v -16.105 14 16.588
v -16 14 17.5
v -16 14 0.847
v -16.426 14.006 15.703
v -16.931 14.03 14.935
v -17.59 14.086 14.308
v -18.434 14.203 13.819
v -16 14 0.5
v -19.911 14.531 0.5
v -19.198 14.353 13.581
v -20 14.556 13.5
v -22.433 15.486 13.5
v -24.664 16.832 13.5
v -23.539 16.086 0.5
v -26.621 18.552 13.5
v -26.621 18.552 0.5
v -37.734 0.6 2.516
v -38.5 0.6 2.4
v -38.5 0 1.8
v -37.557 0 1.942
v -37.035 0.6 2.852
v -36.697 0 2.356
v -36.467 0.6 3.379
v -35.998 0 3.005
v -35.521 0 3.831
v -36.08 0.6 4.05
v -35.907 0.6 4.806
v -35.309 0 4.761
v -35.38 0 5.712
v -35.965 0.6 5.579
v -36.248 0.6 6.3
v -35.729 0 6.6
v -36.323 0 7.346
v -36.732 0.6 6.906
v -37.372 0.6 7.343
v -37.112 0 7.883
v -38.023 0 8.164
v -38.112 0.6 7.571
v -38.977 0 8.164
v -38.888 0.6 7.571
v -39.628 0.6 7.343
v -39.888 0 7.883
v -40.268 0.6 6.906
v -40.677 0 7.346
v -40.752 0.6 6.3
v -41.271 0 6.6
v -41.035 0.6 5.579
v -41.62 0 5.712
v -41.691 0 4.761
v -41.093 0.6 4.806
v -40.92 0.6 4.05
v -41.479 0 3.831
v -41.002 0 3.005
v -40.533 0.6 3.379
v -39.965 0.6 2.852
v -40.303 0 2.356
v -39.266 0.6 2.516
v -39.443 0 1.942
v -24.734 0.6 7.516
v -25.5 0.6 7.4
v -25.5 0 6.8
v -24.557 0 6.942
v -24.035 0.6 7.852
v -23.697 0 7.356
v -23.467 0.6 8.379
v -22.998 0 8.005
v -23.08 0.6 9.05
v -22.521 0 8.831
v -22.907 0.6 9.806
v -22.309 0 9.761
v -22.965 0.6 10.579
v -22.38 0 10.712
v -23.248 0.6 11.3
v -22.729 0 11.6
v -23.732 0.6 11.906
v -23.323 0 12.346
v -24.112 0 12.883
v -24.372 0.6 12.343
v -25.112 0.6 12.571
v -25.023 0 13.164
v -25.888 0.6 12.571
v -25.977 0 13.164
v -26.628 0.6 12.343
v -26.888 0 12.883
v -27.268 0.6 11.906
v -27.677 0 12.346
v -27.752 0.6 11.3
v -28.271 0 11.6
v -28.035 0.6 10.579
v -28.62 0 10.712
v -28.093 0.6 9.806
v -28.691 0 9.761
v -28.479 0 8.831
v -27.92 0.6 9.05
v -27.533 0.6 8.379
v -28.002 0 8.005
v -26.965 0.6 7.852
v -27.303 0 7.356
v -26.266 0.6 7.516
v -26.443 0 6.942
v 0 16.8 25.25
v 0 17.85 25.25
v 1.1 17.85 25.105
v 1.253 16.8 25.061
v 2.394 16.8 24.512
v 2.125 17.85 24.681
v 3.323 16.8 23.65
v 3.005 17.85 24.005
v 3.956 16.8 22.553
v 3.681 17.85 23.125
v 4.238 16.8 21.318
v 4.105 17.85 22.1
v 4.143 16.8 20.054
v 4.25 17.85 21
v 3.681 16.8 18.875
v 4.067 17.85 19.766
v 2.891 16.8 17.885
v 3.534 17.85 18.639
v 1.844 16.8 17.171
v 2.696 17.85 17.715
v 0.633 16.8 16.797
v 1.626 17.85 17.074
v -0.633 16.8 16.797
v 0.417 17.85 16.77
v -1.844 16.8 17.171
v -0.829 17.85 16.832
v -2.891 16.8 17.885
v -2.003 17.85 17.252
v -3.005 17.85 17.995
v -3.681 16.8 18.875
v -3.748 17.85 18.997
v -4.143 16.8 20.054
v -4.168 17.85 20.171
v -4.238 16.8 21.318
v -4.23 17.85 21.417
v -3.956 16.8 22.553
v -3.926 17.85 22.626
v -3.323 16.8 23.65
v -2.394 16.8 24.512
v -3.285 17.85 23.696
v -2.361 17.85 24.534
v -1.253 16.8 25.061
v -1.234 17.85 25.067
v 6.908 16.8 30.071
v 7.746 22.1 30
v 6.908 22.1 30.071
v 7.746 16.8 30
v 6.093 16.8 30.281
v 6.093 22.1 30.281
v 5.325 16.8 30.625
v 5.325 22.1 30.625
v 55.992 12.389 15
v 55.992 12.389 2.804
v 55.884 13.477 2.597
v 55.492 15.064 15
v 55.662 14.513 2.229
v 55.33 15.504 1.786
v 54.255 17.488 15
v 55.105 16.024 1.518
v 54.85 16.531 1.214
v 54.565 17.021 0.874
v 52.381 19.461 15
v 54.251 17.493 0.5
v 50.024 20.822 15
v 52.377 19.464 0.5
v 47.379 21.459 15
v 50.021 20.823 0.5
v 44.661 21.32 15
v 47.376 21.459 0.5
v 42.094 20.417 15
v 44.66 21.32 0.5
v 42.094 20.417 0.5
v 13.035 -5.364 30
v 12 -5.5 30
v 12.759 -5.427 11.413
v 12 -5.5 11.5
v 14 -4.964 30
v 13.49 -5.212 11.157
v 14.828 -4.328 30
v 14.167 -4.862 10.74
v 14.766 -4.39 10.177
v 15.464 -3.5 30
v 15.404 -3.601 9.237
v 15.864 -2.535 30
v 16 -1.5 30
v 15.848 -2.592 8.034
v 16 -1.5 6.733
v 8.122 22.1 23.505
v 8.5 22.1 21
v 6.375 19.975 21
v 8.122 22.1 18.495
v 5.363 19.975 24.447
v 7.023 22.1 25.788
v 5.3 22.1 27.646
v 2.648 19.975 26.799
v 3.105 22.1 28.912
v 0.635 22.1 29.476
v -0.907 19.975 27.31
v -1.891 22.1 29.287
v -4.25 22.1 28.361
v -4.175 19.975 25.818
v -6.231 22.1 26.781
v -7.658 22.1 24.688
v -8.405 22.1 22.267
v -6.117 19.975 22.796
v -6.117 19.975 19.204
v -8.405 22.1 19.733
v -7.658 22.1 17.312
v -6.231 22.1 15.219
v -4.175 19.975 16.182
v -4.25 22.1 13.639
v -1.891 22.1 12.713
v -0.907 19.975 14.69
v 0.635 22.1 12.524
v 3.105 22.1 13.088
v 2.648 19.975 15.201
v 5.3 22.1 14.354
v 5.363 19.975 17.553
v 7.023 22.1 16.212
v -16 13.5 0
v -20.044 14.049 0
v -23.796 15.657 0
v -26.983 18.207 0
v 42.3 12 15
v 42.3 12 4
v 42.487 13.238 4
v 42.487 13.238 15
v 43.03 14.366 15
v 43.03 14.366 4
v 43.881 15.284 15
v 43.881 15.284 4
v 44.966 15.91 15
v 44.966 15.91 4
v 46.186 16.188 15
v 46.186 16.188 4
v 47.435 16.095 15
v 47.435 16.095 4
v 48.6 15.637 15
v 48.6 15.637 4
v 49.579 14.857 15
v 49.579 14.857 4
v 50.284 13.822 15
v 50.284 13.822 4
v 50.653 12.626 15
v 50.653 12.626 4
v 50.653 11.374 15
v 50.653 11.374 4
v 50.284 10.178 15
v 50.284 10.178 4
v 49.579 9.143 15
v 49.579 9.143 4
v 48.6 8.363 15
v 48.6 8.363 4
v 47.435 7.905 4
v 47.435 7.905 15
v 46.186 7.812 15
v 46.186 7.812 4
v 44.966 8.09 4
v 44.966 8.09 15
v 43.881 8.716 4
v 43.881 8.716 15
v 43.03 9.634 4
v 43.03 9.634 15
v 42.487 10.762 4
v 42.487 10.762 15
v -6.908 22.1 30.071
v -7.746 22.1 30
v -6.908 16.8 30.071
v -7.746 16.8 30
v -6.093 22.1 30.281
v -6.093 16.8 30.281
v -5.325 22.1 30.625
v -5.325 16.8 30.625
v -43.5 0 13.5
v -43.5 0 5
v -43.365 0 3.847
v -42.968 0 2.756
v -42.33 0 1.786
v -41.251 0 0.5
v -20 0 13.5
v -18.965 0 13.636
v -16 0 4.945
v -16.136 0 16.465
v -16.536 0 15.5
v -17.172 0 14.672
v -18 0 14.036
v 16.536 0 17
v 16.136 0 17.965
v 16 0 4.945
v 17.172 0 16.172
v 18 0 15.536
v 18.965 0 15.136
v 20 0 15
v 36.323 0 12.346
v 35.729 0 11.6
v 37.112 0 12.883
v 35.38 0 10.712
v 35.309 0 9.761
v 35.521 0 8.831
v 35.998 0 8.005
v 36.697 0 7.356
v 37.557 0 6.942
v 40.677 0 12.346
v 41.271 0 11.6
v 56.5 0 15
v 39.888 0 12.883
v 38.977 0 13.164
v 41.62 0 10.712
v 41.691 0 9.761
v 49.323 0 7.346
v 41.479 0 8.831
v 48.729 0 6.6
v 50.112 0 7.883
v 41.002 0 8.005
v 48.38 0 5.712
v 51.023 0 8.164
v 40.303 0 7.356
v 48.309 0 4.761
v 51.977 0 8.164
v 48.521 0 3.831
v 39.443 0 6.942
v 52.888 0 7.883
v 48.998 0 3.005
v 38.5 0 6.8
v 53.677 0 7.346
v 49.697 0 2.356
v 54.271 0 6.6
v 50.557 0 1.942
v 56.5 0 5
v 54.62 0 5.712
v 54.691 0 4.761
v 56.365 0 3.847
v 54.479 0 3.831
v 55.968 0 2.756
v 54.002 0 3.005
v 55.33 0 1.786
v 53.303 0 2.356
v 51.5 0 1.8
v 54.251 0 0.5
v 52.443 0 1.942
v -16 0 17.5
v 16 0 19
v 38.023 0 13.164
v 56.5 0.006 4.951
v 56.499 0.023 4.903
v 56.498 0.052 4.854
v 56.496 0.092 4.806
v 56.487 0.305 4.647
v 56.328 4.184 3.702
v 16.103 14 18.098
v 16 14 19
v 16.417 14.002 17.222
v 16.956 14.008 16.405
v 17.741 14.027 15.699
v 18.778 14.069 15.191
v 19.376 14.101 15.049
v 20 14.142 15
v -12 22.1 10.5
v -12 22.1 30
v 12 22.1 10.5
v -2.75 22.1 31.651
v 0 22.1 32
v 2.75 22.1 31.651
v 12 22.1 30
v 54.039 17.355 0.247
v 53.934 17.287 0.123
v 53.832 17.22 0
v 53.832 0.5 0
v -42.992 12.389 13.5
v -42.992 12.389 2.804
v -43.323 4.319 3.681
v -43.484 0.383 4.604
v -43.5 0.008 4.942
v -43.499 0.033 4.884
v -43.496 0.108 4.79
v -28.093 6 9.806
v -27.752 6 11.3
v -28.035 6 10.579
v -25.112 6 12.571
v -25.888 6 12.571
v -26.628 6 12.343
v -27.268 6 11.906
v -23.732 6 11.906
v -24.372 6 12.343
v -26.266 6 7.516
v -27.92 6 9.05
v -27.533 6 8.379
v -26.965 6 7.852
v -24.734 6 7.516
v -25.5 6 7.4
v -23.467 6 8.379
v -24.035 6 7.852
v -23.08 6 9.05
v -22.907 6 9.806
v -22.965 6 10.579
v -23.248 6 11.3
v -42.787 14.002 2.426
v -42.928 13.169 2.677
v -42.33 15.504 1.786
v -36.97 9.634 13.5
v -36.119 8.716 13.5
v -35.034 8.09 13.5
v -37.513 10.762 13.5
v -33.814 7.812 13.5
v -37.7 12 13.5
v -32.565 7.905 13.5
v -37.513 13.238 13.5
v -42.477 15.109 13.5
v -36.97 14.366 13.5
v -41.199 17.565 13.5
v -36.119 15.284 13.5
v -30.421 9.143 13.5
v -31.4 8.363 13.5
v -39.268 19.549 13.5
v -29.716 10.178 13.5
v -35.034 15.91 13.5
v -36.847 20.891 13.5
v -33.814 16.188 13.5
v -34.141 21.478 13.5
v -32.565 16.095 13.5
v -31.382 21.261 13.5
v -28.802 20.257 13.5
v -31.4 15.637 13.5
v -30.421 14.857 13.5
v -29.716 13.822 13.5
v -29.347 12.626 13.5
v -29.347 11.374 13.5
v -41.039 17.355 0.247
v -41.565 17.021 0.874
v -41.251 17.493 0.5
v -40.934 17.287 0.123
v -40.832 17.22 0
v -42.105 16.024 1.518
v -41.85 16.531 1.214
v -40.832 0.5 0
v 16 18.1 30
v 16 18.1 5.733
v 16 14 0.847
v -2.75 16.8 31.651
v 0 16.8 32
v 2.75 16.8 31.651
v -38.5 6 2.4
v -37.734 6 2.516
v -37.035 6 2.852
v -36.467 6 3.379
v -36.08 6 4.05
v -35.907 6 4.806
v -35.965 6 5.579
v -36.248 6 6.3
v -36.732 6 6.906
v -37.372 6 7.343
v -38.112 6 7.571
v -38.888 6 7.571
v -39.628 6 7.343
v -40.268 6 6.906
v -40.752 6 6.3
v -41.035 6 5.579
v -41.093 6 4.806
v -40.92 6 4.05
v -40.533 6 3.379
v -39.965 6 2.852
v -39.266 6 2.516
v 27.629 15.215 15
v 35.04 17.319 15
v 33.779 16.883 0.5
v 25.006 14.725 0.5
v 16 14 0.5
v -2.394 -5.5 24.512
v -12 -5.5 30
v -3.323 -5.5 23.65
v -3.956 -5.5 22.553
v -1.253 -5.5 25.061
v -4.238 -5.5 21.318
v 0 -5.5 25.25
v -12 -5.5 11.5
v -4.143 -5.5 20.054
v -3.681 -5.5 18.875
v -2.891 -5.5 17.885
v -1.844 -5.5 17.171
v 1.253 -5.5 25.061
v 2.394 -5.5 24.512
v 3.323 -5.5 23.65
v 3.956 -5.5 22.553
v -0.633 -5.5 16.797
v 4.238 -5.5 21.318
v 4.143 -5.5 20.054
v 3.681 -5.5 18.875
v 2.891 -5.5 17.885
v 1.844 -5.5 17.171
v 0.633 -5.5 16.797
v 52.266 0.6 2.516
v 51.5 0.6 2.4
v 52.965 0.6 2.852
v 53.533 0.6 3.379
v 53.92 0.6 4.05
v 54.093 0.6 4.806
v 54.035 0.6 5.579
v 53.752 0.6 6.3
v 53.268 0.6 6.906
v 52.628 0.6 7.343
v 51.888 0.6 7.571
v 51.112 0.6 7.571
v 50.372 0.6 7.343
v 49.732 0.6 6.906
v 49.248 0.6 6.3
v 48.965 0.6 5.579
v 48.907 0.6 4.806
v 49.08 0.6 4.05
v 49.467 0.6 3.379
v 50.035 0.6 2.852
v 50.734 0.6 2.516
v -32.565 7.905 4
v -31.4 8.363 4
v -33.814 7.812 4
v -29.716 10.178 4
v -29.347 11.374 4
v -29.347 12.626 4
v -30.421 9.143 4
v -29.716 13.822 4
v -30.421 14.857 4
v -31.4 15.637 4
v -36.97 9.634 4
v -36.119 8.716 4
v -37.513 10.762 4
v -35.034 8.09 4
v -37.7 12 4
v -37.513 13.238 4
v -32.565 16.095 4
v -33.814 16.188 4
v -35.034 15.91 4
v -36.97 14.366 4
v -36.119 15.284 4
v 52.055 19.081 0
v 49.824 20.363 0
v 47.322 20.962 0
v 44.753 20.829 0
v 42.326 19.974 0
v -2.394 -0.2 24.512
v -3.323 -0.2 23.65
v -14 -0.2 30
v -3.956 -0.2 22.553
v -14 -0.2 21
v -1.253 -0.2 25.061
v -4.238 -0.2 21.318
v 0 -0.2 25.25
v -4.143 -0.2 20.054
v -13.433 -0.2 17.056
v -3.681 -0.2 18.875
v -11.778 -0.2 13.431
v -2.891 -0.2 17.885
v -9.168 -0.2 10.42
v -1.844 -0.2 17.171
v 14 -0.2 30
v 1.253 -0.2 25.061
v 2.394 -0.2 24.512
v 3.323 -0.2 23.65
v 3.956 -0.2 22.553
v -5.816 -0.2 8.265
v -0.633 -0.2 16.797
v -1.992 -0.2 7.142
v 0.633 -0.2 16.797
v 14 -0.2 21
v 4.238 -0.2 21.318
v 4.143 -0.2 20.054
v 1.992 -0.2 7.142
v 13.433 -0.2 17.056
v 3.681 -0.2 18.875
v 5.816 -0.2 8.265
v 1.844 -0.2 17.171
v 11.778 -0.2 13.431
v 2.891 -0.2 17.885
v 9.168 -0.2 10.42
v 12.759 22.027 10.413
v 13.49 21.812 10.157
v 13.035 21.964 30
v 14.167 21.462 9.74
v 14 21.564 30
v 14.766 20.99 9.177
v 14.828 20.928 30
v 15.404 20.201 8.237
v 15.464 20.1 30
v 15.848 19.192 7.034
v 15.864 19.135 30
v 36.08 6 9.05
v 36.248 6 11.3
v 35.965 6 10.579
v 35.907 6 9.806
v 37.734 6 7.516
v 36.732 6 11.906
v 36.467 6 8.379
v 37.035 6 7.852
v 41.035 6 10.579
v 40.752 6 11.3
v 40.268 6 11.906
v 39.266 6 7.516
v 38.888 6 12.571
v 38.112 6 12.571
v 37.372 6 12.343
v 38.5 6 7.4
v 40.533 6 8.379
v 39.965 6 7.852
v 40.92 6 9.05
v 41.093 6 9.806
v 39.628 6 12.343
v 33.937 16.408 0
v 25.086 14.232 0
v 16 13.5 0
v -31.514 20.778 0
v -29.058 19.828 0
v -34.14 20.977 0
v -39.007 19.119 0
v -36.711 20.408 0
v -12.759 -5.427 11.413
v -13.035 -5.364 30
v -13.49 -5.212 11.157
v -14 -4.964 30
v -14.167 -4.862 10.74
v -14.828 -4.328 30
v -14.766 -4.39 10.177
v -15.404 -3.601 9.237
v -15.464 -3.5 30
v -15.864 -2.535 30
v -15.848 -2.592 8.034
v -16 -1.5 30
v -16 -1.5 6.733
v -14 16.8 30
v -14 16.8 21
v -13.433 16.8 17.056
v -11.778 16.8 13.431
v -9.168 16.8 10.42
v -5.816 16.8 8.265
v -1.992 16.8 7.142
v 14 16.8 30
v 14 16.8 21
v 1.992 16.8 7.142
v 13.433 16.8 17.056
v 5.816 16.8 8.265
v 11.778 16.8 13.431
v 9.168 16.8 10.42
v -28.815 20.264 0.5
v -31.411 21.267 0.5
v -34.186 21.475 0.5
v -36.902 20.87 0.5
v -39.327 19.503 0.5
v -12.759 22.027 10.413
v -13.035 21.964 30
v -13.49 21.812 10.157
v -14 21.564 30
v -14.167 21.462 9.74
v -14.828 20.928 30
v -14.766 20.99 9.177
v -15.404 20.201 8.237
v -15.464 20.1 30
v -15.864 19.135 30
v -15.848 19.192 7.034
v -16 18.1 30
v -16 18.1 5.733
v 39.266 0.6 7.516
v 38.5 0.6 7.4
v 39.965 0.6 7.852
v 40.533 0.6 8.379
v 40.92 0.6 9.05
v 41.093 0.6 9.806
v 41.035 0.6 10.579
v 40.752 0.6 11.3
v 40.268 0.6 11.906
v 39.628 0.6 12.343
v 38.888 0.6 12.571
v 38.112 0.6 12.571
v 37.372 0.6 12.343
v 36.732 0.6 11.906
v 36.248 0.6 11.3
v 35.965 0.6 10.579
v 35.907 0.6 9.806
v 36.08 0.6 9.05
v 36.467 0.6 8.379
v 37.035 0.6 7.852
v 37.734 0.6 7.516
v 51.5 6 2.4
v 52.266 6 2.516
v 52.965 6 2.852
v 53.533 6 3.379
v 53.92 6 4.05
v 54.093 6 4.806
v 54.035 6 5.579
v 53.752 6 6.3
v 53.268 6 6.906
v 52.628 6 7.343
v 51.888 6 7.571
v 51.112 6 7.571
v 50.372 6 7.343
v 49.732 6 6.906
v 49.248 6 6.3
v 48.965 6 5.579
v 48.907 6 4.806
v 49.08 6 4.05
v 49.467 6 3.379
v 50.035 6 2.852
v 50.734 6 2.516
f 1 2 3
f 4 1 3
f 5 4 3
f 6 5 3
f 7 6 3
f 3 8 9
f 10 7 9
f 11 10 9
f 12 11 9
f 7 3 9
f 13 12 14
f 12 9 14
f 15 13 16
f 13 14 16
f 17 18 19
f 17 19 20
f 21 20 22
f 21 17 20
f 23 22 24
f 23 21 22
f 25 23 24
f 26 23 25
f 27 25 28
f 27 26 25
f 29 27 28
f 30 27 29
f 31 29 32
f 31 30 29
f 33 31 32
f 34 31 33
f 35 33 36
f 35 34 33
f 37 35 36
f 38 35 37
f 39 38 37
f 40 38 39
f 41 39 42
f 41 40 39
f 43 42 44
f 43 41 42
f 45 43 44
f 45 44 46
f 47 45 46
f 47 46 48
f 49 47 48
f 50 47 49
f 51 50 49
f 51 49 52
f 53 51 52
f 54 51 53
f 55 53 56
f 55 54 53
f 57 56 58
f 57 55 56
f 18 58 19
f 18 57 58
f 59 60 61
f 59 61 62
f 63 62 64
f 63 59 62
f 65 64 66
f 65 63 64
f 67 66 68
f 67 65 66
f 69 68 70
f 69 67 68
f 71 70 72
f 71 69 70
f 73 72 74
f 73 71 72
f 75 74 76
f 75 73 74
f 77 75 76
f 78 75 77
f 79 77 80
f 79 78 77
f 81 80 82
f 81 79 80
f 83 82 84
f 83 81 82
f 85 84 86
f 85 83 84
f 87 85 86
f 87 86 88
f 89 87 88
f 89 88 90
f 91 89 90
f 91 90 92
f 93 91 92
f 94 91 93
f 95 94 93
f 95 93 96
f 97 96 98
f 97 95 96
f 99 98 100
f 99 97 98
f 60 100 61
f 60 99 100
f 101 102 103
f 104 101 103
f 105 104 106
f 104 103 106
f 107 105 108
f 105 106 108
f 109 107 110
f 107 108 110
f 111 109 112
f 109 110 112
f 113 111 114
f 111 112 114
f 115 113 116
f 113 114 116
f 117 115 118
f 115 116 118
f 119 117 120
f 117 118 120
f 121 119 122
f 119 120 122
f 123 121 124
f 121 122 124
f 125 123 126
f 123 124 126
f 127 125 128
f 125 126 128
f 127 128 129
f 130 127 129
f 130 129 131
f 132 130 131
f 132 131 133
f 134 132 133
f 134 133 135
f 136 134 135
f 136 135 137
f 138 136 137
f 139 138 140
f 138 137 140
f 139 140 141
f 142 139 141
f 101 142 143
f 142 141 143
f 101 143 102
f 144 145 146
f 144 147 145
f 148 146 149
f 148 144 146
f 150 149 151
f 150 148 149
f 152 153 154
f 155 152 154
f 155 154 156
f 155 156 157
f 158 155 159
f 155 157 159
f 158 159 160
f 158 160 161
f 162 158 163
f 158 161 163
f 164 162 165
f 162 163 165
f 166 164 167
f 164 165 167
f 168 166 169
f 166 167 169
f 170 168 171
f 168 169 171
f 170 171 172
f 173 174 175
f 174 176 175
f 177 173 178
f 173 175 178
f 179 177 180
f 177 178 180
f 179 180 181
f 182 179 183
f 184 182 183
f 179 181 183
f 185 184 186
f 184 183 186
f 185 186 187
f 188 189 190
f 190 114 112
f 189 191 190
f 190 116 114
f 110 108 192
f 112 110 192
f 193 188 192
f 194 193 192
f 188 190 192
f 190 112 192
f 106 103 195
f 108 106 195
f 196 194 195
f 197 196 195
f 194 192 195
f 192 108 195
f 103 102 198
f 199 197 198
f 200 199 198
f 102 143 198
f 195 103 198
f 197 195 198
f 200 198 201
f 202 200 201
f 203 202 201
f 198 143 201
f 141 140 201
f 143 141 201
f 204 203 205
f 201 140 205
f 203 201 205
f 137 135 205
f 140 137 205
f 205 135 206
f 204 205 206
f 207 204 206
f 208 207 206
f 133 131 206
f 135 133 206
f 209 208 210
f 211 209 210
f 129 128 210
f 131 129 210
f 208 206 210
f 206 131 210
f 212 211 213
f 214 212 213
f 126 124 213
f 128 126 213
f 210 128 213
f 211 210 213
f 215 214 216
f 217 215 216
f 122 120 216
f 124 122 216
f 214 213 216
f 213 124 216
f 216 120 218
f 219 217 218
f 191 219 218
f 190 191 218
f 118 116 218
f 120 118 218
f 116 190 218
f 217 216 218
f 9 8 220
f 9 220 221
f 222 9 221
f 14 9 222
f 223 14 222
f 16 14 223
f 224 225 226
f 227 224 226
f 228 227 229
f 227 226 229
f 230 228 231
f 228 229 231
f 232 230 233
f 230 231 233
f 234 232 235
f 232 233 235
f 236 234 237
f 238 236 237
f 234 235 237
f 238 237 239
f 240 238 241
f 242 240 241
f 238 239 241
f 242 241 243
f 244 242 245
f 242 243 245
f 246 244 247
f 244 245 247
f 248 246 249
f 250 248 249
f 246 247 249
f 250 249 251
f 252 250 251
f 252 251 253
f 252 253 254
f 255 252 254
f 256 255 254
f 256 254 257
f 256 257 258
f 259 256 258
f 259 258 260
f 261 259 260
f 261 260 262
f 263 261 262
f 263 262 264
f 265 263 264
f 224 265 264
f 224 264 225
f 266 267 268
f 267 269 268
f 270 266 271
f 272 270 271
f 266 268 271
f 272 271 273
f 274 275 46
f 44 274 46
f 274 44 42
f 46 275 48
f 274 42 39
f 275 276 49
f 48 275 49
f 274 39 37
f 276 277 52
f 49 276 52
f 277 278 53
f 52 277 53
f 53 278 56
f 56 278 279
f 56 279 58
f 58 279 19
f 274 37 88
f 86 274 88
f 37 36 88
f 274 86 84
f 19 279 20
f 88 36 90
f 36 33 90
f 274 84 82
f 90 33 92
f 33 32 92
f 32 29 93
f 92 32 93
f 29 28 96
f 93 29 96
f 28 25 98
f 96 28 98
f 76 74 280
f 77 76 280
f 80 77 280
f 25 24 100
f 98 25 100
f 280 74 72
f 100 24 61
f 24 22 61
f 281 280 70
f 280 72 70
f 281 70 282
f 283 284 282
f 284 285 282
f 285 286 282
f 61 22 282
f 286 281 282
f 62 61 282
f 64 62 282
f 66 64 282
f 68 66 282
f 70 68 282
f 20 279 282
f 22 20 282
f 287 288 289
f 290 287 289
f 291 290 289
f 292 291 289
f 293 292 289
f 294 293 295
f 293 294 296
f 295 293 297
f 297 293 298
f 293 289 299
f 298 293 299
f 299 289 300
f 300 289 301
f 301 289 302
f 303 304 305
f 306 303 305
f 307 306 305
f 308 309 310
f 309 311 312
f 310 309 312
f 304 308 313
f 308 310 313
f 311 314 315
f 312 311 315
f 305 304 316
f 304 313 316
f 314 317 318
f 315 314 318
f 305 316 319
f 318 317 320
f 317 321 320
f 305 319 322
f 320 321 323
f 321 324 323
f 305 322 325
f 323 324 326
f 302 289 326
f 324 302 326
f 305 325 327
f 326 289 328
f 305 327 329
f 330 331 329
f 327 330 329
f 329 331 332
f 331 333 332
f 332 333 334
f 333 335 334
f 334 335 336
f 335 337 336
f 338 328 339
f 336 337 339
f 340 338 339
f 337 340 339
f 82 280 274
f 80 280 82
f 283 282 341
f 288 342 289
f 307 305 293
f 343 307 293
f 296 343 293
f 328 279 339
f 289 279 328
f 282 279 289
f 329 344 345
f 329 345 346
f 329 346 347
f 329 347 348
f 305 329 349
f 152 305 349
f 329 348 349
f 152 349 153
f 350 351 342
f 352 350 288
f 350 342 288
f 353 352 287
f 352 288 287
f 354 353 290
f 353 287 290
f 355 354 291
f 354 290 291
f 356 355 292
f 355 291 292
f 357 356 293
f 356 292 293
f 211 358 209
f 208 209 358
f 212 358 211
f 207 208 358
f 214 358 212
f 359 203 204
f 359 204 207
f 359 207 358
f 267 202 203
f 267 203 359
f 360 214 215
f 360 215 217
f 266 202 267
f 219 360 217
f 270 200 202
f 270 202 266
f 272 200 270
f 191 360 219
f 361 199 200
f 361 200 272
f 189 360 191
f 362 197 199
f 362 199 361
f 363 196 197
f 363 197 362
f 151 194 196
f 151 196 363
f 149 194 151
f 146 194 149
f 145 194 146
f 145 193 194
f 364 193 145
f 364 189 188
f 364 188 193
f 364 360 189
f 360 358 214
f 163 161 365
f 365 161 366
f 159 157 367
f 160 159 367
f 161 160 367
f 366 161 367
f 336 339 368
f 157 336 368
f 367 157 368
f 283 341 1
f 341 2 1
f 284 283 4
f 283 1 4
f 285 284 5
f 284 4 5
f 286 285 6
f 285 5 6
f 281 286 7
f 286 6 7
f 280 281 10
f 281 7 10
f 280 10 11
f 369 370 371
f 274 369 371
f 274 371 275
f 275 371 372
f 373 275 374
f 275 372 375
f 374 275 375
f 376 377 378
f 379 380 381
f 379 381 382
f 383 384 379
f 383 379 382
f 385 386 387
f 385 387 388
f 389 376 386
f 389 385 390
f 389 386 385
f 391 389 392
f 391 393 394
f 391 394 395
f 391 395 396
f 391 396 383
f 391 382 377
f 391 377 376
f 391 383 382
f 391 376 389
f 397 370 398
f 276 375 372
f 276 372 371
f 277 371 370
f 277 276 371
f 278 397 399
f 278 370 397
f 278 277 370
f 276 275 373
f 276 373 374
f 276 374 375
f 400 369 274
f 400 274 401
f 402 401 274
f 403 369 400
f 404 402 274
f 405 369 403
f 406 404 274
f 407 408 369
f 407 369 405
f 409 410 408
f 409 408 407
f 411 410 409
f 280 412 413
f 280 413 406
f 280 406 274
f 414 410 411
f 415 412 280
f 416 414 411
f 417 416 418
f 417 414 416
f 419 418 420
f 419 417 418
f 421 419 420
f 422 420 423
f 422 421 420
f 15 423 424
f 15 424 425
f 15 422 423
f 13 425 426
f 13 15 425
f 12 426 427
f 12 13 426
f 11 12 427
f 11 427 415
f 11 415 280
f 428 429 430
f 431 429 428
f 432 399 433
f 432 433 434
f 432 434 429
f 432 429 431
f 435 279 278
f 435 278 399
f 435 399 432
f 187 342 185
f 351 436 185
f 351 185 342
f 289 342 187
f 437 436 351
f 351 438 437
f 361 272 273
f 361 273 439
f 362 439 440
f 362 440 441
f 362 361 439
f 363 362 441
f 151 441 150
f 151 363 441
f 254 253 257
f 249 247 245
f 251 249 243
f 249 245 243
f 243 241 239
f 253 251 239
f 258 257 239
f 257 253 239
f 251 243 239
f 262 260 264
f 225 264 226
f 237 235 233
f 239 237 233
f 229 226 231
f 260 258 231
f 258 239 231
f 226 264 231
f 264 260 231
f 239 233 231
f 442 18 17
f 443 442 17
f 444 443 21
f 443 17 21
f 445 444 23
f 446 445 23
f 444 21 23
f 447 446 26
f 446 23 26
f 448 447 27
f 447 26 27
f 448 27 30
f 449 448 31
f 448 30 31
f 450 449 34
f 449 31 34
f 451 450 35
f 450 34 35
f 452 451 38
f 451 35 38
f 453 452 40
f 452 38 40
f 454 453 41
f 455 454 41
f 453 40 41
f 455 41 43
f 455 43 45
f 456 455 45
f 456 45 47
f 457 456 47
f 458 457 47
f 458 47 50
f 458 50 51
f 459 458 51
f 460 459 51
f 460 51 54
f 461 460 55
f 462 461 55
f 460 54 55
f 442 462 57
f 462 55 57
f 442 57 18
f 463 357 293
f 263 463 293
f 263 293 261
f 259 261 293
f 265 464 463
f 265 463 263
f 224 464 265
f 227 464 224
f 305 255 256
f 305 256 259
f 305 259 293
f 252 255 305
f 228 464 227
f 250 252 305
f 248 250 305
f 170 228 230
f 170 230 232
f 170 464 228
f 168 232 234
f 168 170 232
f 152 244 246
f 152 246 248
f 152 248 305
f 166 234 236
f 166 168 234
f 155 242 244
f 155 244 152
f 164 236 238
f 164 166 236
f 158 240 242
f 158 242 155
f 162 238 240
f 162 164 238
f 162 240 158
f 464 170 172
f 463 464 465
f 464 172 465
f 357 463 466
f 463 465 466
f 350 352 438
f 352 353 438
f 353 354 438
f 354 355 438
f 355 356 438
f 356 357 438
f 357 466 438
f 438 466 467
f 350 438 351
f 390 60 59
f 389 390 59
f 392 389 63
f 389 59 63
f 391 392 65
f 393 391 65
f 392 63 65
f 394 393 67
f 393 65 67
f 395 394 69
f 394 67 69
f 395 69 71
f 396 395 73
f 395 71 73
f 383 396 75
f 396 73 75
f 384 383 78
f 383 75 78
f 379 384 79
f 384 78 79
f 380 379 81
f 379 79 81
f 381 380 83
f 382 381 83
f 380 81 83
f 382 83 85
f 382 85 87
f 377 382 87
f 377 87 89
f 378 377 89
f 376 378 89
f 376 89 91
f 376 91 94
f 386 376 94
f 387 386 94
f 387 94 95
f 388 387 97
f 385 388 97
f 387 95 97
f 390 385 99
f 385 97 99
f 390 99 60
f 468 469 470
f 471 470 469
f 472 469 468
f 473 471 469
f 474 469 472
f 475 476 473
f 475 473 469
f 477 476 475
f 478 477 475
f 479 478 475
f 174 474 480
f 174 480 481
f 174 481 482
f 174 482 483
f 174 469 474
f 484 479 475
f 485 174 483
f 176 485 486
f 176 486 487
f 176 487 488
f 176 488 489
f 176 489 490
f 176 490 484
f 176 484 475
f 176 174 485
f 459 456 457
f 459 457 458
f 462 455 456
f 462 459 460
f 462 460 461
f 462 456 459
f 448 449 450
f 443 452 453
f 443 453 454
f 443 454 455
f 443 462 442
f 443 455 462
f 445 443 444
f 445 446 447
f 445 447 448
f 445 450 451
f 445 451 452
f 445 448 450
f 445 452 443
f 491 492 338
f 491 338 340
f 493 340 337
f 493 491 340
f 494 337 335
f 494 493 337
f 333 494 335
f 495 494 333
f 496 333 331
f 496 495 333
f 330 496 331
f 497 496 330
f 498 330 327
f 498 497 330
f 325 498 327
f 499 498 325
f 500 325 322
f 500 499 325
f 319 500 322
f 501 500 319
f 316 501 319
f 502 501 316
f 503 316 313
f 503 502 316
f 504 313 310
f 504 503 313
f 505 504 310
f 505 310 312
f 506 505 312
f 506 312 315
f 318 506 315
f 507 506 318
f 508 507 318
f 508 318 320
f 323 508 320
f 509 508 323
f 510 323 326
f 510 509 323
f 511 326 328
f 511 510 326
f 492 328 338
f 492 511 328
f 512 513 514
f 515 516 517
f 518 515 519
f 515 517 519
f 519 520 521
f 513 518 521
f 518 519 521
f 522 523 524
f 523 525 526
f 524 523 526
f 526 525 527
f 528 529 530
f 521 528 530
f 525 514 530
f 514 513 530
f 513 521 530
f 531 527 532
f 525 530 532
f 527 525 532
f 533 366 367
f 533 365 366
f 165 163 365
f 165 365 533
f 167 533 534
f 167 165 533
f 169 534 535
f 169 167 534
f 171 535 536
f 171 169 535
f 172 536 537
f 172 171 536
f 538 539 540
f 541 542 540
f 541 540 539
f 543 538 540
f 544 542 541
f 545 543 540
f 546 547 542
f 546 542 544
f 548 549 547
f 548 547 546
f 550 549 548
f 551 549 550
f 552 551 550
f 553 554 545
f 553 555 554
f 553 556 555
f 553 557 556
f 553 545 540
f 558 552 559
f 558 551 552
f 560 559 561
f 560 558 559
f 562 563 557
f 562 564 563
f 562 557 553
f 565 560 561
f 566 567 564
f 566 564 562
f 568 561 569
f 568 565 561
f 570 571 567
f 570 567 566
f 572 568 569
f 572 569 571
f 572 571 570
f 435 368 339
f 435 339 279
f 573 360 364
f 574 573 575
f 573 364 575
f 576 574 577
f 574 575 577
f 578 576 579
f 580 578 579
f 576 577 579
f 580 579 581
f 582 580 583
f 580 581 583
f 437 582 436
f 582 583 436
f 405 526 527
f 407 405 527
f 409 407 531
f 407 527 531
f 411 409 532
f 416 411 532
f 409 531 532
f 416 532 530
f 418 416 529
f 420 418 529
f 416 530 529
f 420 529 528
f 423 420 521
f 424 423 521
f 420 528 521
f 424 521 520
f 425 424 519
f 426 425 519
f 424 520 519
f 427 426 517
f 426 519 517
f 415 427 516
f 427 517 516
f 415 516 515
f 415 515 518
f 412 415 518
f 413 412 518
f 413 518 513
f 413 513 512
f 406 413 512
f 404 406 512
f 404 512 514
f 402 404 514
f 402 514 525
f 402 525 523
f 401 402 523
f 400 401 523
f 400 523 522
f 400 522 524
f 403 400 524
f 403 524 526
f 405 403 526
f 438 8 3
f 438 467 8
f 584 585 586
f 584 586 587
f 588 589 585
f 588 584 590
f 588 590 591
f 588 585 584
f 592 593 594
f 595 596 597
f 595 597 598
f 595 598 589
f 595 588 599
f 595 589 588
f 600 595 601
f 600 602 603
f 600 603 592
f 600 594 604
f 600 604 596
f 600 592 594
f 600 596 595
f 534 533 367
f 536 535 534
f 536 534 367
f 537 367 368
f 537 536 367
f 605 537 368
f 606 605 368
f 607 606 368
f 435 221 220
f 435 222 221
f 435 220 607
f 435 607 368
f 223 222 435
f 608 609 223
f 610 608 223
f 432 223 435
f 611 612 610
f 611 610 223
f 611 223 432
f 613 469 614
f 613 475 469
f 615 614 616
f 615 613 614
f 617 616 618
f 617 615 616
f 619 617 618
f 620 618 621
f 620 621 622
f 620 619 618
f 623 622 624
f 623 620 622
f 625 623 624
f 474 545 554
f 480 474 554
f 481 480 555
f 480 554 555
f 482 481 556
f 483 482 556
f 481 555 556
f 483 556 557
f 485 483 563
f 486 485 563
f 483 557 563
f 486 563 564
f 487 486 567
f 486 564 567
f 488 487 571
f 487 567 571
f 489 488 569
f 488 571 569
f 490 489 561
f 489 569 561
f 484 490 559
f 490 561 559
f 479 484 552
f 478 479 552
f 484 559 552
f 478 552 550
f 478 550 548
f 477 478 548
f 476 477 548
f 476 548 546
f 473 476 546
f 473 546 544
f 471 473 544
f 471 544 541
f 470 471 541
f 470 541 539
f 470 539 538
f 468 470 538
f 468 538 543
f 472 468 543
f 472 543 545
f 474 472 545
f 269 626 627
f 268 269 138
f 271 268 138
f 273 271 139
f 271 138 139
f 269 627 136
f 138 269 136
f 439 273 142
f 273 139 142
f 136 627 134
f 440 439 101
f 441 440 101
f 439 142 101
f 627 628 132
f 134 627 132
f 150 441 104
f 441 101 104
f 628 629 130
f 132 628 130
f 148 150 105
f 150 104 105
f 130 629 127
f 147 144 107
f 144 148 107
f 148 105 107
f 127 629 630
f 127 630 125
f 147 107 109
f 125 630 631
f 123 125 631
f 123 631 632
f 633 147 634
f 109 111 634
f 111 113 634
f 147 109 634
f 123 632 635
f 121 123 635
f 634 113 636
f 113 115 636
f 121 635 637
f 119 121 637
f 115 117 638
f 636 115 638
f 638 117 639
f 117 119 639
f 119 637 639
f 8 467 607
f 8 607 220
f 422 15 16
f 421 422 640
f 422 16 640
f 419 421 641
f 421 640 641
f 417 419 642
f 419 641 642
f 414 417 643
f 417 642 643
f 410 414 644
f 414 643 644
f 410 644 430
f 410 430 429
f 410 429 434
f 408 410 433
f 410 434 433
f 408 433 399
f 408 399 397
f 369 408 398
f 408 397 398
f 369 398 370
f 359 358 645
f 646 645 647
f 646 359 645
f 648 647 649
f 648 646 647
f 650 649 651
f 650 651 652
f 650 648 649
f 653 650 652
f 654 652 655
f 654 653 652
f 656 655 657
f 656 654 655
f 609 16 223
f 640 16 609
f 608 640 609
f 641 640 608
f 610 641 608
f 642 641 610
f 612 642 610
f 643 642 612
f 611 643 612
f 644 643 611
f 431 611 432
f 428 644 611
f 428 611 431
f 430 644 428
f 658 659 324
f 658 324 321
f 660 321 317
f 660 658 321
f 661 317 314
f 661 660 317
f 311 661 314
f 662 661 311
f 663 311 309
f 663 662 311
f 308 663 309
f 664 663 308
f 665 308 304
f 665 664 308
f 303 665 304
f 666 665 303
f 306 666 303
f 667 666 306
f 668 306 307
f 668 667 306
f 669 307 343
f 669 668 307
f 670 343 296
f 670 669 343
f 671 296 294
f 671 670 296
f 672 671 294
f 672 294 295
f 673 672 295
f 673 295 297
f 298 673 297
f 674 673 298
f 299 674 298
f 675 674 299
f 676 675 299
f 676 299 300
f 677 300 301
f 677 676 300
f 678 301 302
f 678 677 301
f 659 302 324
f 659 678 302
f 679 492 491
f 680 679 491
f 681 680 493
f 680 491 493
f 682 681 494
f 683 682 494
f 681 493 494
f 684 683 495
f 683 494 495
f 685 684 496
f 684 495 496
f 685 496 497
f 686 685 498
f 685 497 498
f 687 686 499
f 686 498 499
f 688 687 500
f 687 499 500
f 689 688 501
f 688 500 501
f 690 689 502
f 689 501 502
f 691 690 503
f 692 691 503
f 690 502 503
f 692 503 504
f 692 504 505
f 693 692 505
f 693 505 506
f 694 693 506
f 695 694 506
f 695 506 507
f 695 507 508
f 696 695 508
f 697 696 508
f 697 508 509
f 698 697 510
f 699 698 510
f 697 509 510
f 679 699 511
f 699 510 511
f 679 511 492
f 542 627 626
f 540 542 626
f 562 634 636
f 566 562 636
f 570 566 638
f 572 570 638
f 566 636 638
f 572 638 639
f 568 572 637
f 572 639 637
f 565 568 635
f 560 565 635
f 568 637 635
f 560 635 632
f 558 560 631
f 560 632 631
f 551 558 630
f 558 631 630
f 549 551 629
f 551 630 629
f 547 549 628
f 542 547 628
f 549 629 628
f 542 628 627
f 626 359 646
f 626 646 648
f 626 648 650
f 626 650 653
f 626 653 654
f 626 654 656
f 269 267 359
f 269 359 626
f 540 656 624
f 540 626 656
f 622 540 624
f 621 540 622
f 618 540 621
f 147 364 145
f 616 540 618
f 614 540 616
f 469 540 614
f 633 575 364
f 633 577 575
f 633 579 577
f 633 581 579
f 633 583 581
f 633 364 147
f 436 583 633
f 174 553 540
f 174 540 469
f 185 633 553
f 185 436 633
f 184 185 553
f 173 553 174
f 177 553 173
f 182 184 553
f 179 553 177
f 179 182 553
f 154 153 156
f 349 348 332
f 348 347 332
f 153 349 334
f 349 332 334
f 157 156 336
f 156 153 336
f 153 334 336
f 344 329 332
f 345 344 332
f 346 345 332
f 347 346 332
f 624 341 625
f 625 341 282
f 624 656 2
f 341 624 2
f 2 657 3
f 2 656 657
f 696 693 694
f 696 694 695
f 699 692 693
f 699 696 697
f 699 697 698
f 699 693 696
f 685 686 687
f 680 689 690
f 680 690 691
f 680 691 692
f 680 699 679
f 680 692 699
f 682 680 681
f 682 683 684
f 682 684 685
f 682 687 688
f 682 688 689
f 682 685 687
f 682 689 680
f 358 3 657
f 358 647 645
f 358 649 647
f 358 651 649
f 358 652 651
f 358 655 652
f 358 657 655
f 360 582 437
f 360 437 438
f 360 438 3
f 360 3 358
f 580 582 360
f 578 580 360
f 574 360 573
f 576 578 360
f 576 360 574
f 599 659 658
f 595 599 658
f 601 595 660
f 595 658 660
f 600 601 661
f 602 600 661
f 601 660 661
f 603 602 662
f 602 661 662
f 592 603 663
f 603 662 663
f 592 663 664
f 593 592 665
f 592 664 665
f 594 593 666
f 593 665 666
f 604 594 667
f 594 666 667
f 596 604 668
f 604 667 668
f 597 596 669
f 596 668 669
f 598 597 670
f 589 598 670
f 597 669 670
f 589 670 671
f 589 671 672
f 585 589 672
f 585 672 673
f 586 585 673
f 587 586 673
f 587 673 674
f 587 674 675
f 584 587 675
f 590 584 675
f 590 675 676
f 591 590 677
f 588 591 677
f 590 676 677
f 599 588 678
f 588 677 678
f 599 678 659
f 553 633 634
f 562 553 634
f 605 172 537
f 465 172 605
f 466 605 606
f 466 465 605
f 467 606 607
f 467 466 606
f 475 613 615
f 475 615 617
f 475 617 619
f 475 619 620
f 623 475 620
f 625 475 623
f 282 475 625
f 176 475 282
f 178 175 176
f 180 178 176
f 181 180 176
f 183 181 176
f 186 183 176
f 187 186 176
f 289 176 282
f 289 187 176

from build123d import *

# Parameters (mm, degrees)
BOSS_EXTRUDE1_DEPTH                             = 16
SKETCH2_R                                       = 4.25
CUT_EXTRUDE1_DEPTH                              = 28.6
CUT_EXTRUDE2_START                              = -5.3
CUT_EXTRUDE2_DEPTH                              = 17
CSK_FOR_M8_FLAT_HEAD_MACHINE_SCREW1_D           = 8
CSK_FOR_M8_FLAT_HEAD_MACHINE_SCREW1_CSINK_D     = 17
CSK_FOR_M8_FLAT_HEAD_MACHINE_SCREW1_CSINK_ANGLE = 90
SKETCH6_R                                       = 4.2
BOSS_EXTRUDE2_DEPTH                             = 15
SKETCH7_R                                       = 4.2
BOSS_EXTRUDE3_DEPTH                             = 4
SKETCH9_R                                       = 2.6
CUT_EXTRUDE3_DEPTH                              = 6
CUT_EXTRUDE4_DEPTH                              = 1.5
FILLET2_R                                       = 4
FILLET3_R                                       = 4
BOSS_EXTRUDE4_DEPTH                             = 5.3
FILLET4_R                                       = 5
CHAMFER1_SIZE                                   = 0.6
CUT_EXTRUDE5_DEPTH                              = 23.1
CHAMFER2_SIZE                                   = 0.5


with BuildPart() as part:
    # Sketch1 → Boss-Extrude1 (new body, symmetric)
    with BuildSketch(Plane(origin=(0, 0, 0), x_dir=(0, 0, -1), z_dir=(1, 0, 0))):
        Polygon((0, 0), (0, 14), (-0.8467959, 14), (-10.5, 22.1), (-30, 22.1), (-30, -5.5), (-11.5, -5.5), (-4.945355241, 0), align=None)
    extrude(amount=BOSS_EXTRUDE1_DEPTH, both=True)

    # Sketch2 → Cut-Extrude1 (cut, through all)
    with BuildSketch(Plane(origin=(0, 22.1, 0), x_dir=(1, 0, 0), z_dir=(0, 1, 0))):
        with Locations(Location((0, -21, 0), (0, 0, 270))):  # turned: the seam where the file's is
            Circle(SKETCH2_R)
    extrude(amount=-CUT_EXTRUDE1_DEPTH, mode=Mode.SUBTRACT)

    # Sketch3 → Cut-Extrude2 (cut)
    with BuildSketch(Plane(origin=(0, 22.1, 0), x_dir=(1, 0, 0), z_dir=(0, 1, 0)).offset(CUT_EXTRUDE2_START)):
        with BuildLine():
            Line((-14, -21), (-14, -59.082734499))
            Line((-14, -59.082734499), (14, -59.082734499))
            Line((14, -59.082734499), (14, -21))
            ThreePointArc((14, -21), (0, -7), (-14, -21))
        make_face()
    extrude(amount=-CUT_EXTRUDE2_DEPTH, mode=Mode.SUBTRACT)

    # CSK for M8 Flat Head Machine Screw1 (through all)
    with Locations(Plane(origin=(0, 22.1, 0), x_dir=(-1, 0, 0), z_dir=(0, 1, 0))):
        with Locations((0, 21)):
            CounterSinkHole(CSK_FOR_M8_FLAT_HEAD_MACHINE_SCREW1_D / 2, CSK_FOR_M8_FLAT_HEAD_MACHINE_SCREW1_CSINK_D / 2, counter_sink_angle=CSK_FOR_M8_FLAT_HEAD_MACHINE_SCREW1_CSINK_ANGLE)

    # Sketch6 → Boss-Extrude2 (add)
    with BuildSketch(Plane(origin=(0, 0, 0), x_dir=(-1, 0, 0), z_dir=(0, 0, -1))):
        with BuildLine():
            Line((-16, 14), (-16, 0))
            Line((-16, 0), (-56.5, 0))
            Line((-56.5, 0), (-55.992024719, 12.389187266))
            ThreePointArc((-55.992024719, 12.389187266), (-51.251583122, 20.226327117), (-42.094272681, 20.41662443))
            ThreePointArc((-42.094272681, 20.41662443), (-29.435811623, 15.627699401), (-16, 14))
        make_face()
        with Locations((-46.5, 12)):
            Circle(SKETCH6_R, mode=Mode.SUBTRACT)
        with BuildLine():
            Line((42.992024719, 12.389187266), (43.5, 0))
            Line((43.5, 0), (16, 0))
            Line((16, 0), (16, 14))
            ThreePointArc((16, 14), (21.777483046, 15.185872893), (26.620689655, 18.551724138))
            ThreePointArc((26.620689655, 18.551724138), (36.846757278, 20.890962587), (42.992024719, 12.389187266))
        make_face()
        with Locations((33.5, 12)):
            Circle(SKETCH6_R, mode=Mode.SUBTRACT)
    extrude(amount=-BOSS_EXTRUDE2_DEPTH)

    # Sketch7 → Boss-Extrude3 (add)
    with BuildSketch(Plane(origin=(0, 0, 0), x_dir=(-1, 0, 0), z_dir=(0, 0, -1))):
        with Locations((-46.5, 12)):
            Circle(SKETCH7_R)
        with Locations((33.5, 12)):
            Circle(SKETCH7_R)
    extrude(amount=-BOSS_EXTRUDE3_DEPTH)

    # Sketch9 → Cut-Extrude3 (cut)
    with BuildSketch(Plane.XZ):
        with Locations(Location((-38.5, 5, 0), (0, 0, 270))):  # turned: the seam where the file's is
            Circle(SKETCH9_R)
        with Locations(Location((-25.5, 10, 0), (0, 0, 270))):  # turned: the seam where the file's is
            Circle(SKETCH9_R)
        with Locations(Location((38.5, 10, 0), (0, 0, 270))):  # turned: the seam where the file's is
            Circle(SKETCH9_R)
        with Locations(Location((51.5, 5, 0), (0, 0, 270))):  # turned: the seam where the file's is
            Circle(SKETCH9_R)
    extrude(amount=-CUT_EXTRUDE3_DEPTH, mode=Mode.SUBTRACT)

    # Sketch11 → Cut-Extrude4 (cut)
    with BuildSketch(Plane.XY.offset(15)):
        with BuildLine():
            Line((-42.992024719, 12.389187266), (-43.5, 0))
            Line((-43.5, 0), (-16, 0))
            Line((-16, 0), (-16, 14))
            ThreePointArc((-16, 14), (-21.777483046, 15.185872893), (-26.620689655, 18.551724138))
            ThreePointArc((-26.620689655, 18.551724138), (-36.846757278, 20.890962587), (-42.992024719, 12.389187266))
        make_face()
    extrude(amount=-CUT_EXTRUDE4_DEPTH, mode=Mode.SUBTRACT)

    # Fillet2
    fillet2_edges = [part.edges().sort_by_distance(p)[0] for p in [
        (-16, 7, 13.5),
        (16, 7, 15),
    ]]
    fillet(fillet2_edges, radius=FILLET2_R)

    # Fillet3
    fillet3_edges = [part.edges().sort_by_distance(p)[0] for p in [
        (16, -5.5, 20.75),
        (-16, -5.5, 20.75),
        (-16, 22.1, 20.25),
        (16, 22.1, 20.25),
    ]]
    fillet(fillet3_edges, radius=FILLET3_R)

    # Sketch10 → Boss-Extrude4 (add)
    with BuildSketch(Plane(origin=(0, 22.1, 0), x_dir=(1, 0, 0), z_dir=(0, 1, 0))):
        with BuildLine():
            Line((6.32455532, -30), (-6.32455532, -30))
            ThreePointArc((-6.32455532, -30), (0, -32), (6.32455532, -30))
        make_face()
    extrude(amount=-BOSS_EXTRUDE4_DEPTH)

    # Fillet4
    fillet4_edges = [part.edges().sort_by_distance(p)[0] for p in [
        (6.32455532, 19.45, 30),
        (-6.32455532, 19.45, 30),
    ]]
    fillet(fillet4_edges, radius=FILLET4_R)

    # Chamfer1
    chamfer1_edges = [part.edges().sort_by_distance(p)[0] for p in [
        (-38.5, 0, 7.6),
        (-25.5, 0, 12.6),
        (38.5, 0, 12.6),
        (51.5, 0, 7.6),
    ]]
    chamfer(chamfer1_edges, length=CHAMFER1_SIZE)

    # Sketch12 → Cut-Extrude5 (cut, through all)
    with BuildSketch(Plane.XZ):
        with BuildLine():
            Line((-42.330222216, 1.786061952), (-40.831538291, 0))
            Line((-40.831538291, 0), (-43.5, 0))
            Line((-43.5, 0), (-43.5, 5))
            ThreePointArc((-43.5, 5), (-43.198463104, 3.289899283), (-42.330222216, 1.786061952))
        make_face()
        with BuildLine():
            Line((55.330222216, 1.786061952), (53.831538291, 0))
            Line((53.831538291, 0), (56.5, 0))
            Line((56.5, 0), (56.5, 5))
            ThreePointArc((56.5, 5), (56.198463104, 3.289899283), (55.330222216, 1.786061952))
        make_face()
    extrude(amount=-CUT_EXTRUDE5_DEPTH, mode=Mode.SUBTRACT)

    # Chamfer2
    chamfer2_edges = [part.edges().sort_by_distance(p)[0] for p in [
        (-33.840931852, 21.493880422, 0),
        (-21.777483046, 15.185872893, 0),
        (0, 14, 0),
        (29.435811623, 15.627699401, 0),
        (48.384280249, 21.311255981, 0),
        (6.5, 0, 0),
    ]]
    chamfer(chamfer2_edges, length=CHAMFER2_SIZE)


solid = part.part
